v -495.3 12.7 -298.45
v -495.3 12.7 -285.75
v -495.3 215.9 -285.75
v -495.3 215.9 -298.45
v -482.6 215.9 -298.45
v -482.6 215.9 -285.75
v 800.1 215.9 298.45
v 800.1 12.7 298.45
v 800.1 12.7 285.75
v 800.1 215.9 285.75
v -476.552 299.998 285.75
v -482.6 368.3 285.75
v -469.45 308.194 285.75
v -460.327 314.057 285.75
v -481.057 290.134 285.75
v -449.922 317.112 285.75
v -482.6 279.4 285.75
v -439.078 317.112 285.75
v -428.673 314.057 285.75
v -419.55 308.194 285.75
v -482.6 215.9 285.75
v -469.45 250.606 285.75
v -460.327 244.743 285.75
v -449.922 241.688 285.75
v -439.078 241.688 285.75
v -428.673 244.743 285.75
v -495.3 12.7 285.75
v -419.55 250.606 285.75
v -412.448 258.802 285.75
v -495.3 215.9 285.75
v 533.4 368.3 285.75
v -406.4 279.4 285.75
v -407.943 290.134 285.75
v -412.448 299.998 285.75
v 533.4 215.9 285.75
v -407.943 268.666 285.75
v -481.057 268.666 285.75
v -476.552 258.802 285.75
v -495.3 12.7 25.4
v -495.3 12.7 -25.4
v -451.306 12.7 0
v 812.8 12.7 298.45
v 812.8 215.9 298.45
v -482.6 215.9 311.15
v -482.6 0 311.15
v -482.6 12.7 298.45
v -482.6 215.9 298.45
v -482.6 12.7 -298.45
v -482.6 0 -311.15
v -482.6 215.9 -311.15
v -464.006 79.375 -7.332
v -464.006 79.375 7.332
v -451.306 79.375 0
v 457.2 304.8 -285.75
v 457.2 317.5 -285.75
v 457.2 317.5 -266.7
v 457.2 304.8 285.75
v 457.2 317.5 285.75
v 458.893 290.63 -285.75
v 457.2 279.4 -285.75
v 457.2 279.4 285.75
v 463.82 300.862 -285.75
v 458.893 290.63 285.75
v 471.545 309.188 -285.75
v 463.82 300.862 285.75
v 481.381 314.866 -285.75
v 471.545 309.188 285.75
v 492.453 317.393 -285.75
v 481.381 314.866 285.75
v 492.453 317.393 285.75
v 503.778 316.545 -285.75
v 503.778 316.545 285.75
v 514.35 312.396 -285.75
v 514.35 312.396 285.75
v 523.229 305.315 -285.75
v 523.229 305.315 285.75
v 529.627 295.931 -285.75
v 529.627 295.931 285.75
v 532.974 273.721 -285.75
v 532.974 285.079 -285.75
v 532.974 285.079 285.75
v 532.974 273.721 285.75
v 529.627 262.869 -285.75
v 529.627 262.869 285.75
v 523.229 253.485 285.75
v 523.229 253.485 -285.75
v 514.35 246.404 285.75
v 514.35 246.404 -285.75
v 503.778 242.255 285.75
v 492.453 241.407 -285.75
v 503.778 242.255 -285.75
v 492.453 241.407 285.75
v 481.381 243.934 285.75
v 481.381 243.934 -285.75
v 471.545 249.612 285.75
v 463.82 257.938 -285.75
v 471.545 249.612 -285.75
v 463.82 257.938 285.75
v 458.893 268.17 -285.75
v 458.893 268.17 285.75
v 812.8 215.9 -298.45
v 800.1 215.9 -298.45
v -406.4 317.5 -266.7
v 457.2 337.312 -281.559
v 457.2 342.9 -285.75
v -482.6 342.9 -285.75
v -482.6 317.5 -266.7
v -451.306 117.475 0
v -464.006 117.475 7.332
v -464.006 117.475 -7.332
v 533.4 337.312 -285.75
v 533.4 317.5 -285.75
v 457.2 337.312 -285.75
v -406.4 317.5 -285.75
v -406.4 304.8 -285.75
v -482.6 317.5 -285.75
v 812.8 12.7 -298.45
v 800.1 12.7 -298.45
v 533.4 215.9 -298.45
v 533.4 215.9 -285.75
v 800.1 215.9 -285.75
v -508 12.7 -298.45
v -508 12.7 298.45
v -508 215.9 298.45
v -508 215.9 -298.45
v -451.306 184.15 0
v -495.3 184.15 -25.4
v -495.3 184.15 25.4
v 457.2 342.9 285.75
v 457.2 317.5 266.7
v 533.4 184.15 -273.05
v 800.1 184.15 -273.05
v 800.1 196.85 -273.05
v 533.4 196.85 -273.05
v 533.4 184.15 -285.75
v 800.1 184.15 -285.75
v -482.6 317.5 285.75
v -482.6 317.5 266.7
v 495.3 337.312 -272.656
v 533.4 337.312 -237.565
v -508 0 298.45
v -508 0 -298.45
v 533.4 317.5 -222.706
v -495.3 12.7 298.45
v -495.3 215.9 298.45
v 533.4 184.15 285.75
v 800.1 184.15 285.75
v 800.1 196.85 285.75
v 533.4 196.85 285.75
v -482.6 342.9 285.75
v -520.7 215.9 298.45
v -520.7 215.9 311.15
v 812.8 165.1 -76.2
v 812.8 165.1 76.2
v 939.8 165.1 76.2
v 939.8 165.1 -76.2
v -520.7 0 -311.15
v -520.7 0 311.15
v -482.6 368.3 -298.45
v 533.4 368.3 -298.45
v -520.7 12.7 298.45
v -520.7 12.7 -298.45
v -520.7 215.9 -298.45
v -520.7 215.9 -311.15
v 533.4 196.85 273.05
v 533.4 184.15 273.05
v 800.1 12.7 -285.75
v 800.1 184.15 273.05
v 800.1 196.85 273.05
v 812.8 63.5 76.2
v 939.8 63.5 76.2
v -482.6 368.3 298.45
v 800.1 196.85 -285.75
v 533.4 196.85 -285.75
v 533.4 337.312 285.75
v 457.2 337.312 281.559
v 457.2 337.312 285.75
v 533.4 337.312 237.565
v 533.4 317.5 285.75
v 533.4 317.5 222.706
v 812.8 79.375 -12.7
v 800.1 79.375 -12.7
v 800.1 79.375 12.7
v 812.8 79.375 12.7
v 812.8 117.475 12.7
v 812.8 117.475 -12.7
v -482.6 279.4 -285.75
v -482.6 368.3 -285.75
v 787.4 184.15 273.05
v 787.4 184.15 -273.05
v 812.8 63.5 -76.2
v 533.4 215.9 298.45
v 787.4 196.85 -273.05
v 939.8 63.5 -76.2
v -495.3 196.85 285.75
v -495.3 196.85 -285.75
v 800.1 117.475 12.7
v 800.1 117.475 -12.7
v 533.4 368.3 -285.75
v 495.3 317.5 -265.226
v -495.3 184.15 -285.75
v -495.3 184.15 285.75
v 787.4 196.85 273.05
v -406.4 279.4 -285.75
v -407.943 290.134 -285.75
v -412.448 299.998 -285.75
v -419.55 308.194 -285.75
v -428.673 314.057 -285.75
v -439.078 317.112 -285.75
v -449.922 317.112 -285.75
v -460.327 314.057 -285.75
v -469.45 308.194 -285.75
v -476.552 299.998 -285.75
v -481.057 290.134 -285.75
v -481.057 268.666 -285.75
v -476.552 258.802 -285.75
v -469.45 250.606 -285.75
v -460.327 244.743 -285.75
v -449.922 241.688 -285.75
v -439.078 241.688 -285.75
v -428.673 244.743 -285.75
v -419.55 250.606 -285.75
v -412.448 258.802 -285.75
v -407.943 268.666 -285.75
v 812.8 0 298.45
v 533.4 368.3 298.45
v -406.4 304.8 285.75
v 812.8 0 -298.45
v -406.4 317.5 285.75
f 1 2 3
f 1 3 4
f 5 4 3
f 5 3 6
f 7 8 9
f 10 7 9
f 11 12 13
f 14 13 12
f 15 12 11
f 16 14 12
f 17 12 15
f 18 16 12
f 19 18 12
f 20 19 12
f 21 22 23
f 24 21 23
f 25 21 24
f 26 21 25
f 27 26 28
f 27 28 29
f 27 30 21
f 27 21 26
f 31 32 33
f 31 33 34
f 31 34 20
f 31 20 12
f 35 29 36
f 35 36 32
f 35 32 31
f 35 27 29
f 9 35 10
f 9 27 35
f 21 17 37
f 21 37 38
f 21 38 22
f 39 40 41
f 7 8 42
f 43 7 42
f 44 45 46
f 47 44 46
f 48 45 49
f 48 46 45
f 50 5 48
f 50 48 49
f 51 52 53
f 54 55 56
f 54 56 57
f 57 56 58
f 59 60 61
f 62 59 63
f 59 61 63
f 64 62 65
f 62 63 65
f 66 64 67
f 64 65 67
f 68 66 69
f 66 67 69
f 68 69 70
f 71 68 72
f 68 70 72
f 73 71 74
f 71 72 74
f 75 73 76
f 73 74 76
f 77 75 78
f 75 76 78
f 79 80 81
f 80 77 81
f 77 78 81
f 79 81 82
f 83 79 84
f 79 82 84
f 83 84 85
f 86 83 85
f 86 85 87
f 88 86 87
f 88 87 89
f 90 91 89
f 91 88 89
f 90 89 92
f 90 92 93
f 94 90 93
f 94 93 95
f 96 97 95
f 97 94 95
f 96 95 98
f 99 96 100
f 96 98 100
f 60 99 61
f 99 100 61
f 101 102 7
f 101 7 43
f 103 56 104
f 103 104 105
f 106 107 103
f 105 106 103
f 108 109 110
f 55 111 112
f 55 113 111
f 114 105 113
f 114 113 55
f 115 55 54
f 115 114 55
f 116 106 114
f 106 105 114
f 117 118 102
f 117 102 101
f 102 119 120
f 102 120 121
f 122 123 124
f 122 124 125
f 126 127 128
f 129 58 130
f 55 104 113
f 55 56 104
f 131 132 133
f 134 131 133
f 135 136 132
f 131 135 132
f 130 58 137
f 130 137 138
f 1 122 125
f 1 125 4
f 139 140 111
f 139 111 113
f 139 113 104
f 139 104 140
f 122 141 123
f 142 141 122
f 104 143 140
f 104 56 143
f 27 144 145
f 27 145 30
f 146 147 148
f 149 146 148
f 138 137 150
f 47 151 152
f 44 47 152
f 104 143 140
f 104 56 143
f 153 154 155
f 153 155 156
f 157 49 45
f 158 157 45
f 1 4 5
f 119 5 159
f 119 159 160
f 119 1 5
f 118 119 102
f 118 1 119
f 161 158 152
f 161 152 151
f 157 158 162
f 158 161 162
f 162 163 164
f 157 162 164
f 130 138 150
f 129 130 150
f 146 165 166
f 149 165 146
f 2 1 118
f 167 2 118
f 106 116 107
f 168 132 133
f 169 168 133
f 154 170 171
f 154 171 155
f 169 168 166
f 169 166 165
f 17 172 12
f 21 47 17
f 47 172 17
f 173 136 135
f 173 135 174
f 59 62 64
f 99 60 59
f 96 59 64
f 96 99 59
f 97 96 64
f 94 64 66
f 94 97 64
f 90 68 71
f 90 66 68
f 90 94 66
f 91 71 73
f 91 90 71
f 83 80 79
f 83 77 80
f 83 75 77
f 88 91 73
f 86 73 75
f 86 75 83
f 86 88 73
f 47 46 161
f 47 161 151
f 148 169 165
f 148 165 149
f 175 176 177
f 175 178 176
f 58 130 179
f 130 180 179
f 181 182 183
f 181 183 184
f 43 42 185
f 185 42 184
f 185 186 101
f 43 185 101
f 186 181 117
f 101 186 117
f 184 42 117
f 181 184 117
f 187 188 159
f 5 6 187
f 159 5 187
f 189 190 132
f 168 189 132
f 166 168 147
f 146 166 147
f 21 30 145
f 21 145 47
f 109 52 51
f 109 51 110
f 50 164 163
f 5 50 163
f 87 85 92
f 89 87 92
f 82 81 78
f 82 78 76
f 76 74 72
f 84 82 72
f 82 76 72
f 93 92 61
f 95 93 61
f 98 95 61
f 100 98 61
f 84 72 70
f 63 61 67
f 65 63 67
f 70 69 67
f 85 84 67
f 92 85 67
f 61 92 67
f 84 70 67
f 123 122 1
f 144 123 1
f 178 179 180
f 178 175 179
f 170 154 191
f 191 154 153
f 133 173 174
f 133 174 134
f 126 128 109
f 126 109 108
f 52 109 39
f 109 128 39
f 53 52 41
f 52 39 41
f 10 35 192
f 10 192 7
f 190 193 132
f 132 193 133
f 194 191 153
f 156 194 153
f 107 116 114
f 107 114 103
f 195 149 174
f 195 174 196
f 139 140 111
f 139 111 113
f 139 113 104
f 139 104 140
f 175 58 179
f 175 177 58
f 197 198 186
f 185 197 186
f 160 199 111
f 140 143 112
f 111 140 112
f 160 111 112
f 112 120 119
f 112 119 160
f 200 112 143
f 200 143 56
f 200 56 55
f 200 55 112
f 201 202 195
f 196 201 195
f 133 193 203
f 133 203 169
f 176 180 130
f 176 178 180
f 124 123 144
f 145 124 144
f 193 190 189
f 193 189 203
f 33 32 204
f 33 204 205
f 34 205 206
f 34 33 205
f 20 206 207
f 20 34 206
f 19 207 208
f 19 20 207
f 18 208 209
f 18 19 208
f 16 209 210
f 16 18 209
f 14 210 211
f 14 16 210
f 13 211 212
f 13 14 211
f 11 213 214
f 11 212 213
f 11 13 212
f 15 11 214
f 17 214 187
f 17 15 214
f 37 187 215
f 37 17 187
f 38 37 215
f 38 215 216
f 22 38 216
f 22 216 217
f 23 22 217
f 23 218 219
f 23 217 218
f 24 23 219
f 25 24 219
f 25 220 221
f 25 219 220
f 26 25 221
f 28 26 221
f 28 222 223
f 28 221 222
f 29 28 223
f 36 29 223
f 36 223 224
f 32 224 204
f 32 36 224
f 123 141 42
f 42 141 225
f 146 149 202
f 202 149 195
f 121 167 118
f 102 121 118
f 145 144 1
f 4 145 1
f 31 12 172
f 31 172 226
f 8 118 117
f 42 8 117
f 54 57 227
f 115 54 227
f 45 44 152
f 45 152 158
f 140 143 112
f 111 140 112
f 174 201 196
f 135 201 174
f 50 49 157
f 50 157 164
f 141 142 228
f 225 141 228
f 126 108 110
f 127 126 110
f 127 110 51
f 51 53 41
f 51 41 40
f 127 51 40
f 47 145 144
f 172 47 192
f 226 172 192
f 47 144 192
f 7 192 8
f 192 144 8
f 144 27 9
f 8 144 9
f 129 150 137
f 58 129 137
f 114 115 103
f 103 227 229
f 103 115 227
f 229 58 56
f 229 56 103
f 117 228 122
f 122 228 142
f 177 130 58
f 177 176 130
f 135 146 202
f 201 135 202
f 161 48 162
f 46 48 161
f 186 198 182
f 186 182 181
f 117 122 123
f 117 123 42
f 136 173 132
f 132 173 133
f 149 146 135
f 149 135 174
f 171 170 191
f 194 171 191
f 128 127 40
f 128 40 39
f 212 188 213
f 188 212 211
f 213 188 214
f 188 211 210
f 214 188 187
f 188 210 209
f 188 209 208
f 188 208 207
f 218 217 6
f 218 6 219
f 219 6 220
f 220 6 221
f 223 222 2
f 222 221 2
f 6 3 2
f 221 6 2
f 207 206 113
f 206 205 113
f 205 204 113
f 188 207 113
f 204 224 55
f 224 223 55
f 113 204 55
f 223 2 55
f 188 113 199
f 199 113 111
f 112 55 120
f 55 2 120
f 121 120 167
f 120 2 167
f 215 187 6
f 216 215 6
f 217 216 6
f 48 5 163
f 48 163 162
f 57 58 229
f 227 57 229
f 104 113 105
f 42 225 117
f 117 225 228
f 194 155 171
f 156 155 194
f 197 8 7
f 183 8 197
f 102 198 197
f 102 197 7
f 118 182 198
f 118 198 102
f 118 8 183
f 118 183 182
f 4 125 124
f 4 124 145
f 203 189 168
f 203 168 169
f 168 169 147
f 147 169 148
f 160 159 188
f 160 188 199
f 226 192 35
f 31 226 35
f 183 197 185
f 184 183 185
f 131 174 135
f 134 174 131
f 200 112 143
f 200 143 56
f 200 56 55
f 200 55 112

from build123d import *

# Parameters (mm, degrees)
SKETCH1_W                             = 1016
SKETCH1_H                             = 596.9
SKETCH1_W_2                           = 304.8
FOND_DEPTH                            = 12.7
SKETCH2_W                             = 1295.4
SKETCH2_H                             = 12.7
COT_S_HAUT_DEPTH                      = 203.2
COT_S_HAUT_2_DEPTH                    = 203.2
SKETCH3_W                             = 12.7
SKETCH3_H                             = 596.9
COT_ES_BAS_DEPTH                      = 203.2
COT_ES_BAS_2_DEPTH                    = 203.2
SKETCH4_W                             = 1016
SKETCH4_H                             = 12.7
SUPPORT_CAGE_DEPTH                    = 152.4
SKETCH5_W                             = 12.7
SKETCH5_H                             = 12.7
SUPPORT_TRAPPE_COT_ES_DEPTH           = 266.7
SUPPORT_TRAPPE_COT_ES_2_DEPTH         = 266.7
SUPPORT_TRAPPE_DEVANT_REACH           = 1061.67
SKETCH6_W                             = 12.7
SKETCH6_H                             = 12.7
PLANCHER_MILLIEU_REACH                = 1068.573
SKETCH7_W                             = 1028.7
SKETCH7_H                             = 12.7
ROULEAU_REACH                         = 1068.573
SKETCH8_R                             = 38.1
SKETCH10_W                            = 863.6
SKETCH10_H                            = 12.7
SOUTIEN_TAPIS_DEPTH                   = 571.5
REBORD_START                          = -1016
REBORD_TAPIS_DEPTH                    = 939.8
V_POUR_VIS_SANS_FIN_DEPTH             = 171.45
SKETCH14_W                            = 152.4
SKETCH14_H                            = 101.6
MOTEUR_VIS_SANS_FIN_DEPTH             = 127
TROU_V_VIS_SANS_FIN_REACH             = 1054.588
SKETCH17_W                            = 12.7
SKETCH17_H                            = 38.1
TROU_V_VIS_SANS_FIN_DIRECTION_2_REACH = 1054.588
TROU_SORTIE_VIS_SANS_FIN_DEPTH        = 12.7
TROU_SORTIE_VIS_SANS_FIN_DEPTH_BACK   = 12.7
SKETCH18_W                            = 127
SKETCH18_H                            = 38.1
REBORD_START_2                        = -25.4
REBORD_POUR_SAC_POUBELLE_DEPTH        = 38.1


with BuildPart() as part:
    # Sketch1 → Fond (new body)
    with BuildSketch(Plane(origin=(0, 0, 0), x_dir=(1, 0, 0), z_dir=(0, 1, 0))):
        Rectangle(SKETCH1_W, SKETCH1_H)
        with Locations((660.4, 0)):
            Rectangle(SKETCH1_W_2, SKETCH1_H)
    extrude(amount=FOND_DEPTH)


with BuildPart() as body_2:
    # Sketch2 → Cotés Haut (new body)
    with BuildSketch(Plane(origin=(0, 12.7, 0), x_dir=(1, 0, 0), z_dir=(0, 1, 0))):
        with Locations((152.4, 292.1)):
            Rectangle(SKETCH2_W, SKETCH2_H)
    extrude(amount=COT_S_HAUT_DEPTH)



with BuildPart() as body_3:
    # Sketch2 → Cot_s Haut 2 (new body)
    with BuildSketch(Plane(origin=(0, 12.7, 0), x_dir=(1, 0, 0), z_dir=(0, 1, 0))):
        with Locations((152.4, -292.1)):
            Rectangle(SKETCH2_W, SKETCH2_H)
    extrude(amount=COT_S_HAUT_2_DEPTH)


with BuildPart() as body_4:
    # Sketch3 → Cotées Bas (new body)
    with BuildSketch(Plane(origin=(0, 12.7, 0), x_dir=(1, 0, 0), z_dir=(0, 1, 0))):
        with Locations((-501.65, 0)):
            Rectangle(SKETCH3_W, SKETCH3_H)
    extrude(amount=COT_ES_BAS_DEPTH)


with BuildPart() as body_5:
    # Sketch3 → Cot_es Bas 2 (new body)
    with BuildSketch(Plane(origin=(0, 12.7, 0), x_dir=(1, 0, 0), z_dir=(0, 1, 0))):
        with Locations((806.45, 0)):
            Rectangle(SKETCH3_W, SKETCH3_H)
    extrude(amount=COT_ES_BAS_2_DEPTH)

    # Sketch18 → Trou sortie vis sans fin (cut, two sides: drawn at the far end of the back side and taken through both)
    with BuildSketch(Plane.XY.offset(-TROU_SORTIE_VIS_SANS_FIN_DEPTH_BACK)):
        with Locations((863.6, 98.425)):
            Rectangle(SKETCH18_W, SKETCH18_H)
    extrude(amount=TROU_SORTIE_VIS_SANS_FIN_DEPTH + TROU_SORTIE_VIS_SANS_FIN_DEPTH_BACK, mode=Mode.SUBTRACT)


with BuildPart() as body_2_1:
    add(body_2.part)

    add(body_3.part)  # Support Cage merges body 3
    # Sketch4 → Support Cage (add)
    with BuildSketch(Plane(origin=(0, 215.9, 0), x_dir=(1, 0, 0), z_dir=(0, 1, 0))):
        with Locations((25.4, 292.1)):
            Rectangle(SKETCH4_W, SKETCH4_H)
        with Locations((25.4, -292.1)):
            Rectangle(SKETCH4_W, SKETCH4_H)
    extrude(amount=SUPPORT_CAGE_DEPTH)


with BuildPart() as body_5_2:
    # Sketch5 → Support Trappe cotées (new body)
    with BuildSketch(Plane.ZY.offset(-800.1)):
        with Locations((-279.4, 190.5)):
            Rectangle(SKETCH5_W, SKETCH5_H)
    extrude(amount=SUPPORT_TRAPPE_COT_ES_DEPTH)


with BuildPart() as body_6:
    # Sketch5 → Support Trappe cot_es 2 (new body)
    with BuildSketch(Plane.ZY.offset(-800.1)):
        with Locations((279.4, 190.5)):
            Rectangle(SKETCH5_W, SKETCH5_H)
    extrude(amount=SUPPORT_TRAPPE_COT_ES_2_DEPTH)


with BuildPart() as body_7:

    # Sketch6 → Support Trappe devant (new, up to next)
    with BuildSketch(Plane.XY.offset(-273.05), mode=Mode.PRIVATE) as support_trappe_devant_sk1:
        with Locations((793.75, 190.5)):
            Rectangle(SKETCH6_W, SKETCH6_H)
    support_trappe_devant_tool1 = extrude(support_trappe_devant_sk1.sketch, amount=SUPPORT_TRAPPE_DEVANT_REACH, mode=Mode.PRIVATE) - body_6.part
    add(support_trappe_devant_tool1.solids().sort_by_distance((793.75, 190.5, -273.05))[0])


with BuildPart() as body_8:

    # Sketch7 → Plancher millieu (new, up to next)
    with BuildSketch(Plane(origin=(0, 0, 285.75), x_dir=(-1, 0, 0), z_dir=(0, 0, -1)), mode=Mode.PRIVATE) as plancher_millieu_sk1:
        with Locations((-19.05, 190.5)):
            Rectangle(SKETCH7_W, SKETCH7_H)
    plancher_millieu_tool1 = extrude(plancher_millieu_sk1.sketch, amount=PLANCHER_MILLIEU_REACH, mode=Mode.PRIVATE) - body_2_1.part
    add(plancher_millieu_tool1.solids().sort_by_distance((19.05, 190.5, 285.75))[0])


with BuildPart() as body_9:

    # Sketch8 → Rouleau (new, up to next)
    with BuildSketch(Plane(origin=(0, 0, 285.75), x_dir=(-1, 0, 0), z_dir=(0, 0, -1)), mode=Mode.PRIVATE) as rouleau_sk1:
        with Locations((-495.3, 279.4)):
            Circle(SKETCH8_R)
    rouleau_tool1 = extrude(rouleau_sk1.sketch, amount=ROULEAU_REACH, mode=Mode.PRIVATE) - body_2_1.part
    rouleau = rouleau_tool1.solids().sort_by_distance((495.3, 279.4, 285.75))[0]
    add(rouleau)


with BuildPart() as body_2_2:
    add(body_2_1.part)

    # Mirror1: Rouleau across plane
    add(rouleau.mirror(Plane(origin=(25.4, 0, 0), x_dir=(0, 0, 1), z_dir=(1, 0, 0))))

    # Mirror9 2: loft between two sections, ruled curve by curve
    mirror9_2_from = [
        Edge.make_line((533.4, 337.312, -237.564909488), (533.4, 337.312, -285.75)),
        Edge.make_line((533.4, 317.5, -285.75), (533.4, 317.5, -222.705909488)),
        Edge.make_line((533.4, 317.5, -222.705909488), (533.4, 337.312, -237.564909488)),
        Edge.make_line((533.4, 317.5, -285.75), (533.4, 337.312, -285.75)),
    ]
    mirror9_2_to = [
        Edge.make_line((457.2, 337.312, -281.559), (457.2, 337.312, -285.75)),
        Edge.make_line((457.2, 317.5, -285.75), (457.2, 317.5, -266.7)),
        Edge.make_line((457.2, 317.5, -266.7), (457.2, 337.312, -281.559)),
        Edge.make_line((457.2, 317.5, -285.75), (457.2, 337.312, -285.75)),
    ]
    mirror9_2 = Solid(Shell([*[Face.make_surface_from_curves(mirror9_2_from[k], mirror9_2_to[k]) for k in range(4)], Face(Wire(mirror9_2_from)), Face(Wire(mirror9_2_to))]))
    add(mirror9_2)


with BuildPart() as body_10:
    # Sketch10 → Soutien tapis (new body)
    with BuildSketch(Plane(origin=(0, 0, 285.75), x_dir=(-1, 0, 0), z_dir=(0, 0, -1))):
        with Locations((-25.4, 311.15)):
            Rectangle(SKETCH10_W, SKETCH10_H)
    extrude(amount=SOUTIEN_TAPIS_DEPTH)


with BuildPart() as body_11:
    # Rebord tapis: read off the stored shape, not the designer's step
    # Rebord tapis outline → Rebord tapis (new body)
    with BuildSketch(Plane(origin=(533.4, 0, 0), x_dir=(0, 0, -1), z_dir=(1, 0, 0)).offset(REBORD_START)):
        Polygon((-285.75, 317.5), (-266.7, 317.5), (-285.75, 342.9), align=None)
    rebord_tapis = extrude(amount=REBORD_TAPIS_DEPTH)


with BuildPart() as body_10_1:
    add(body_10.part)

    # Mirror5: Rebord tapis across plane
    add(rebord_tapis.mirror(Plane.XY))

    # Mirror9: read off the stored shape, not the designer's step
    # Mirror9: loft between two sections, ruled curve by curve
    mirror9_from = [
        Edge.make_line((533.4, 317.5, -285.75), (533.4, 317.5, -222.705909488)),
        Edge.make_line((533.4, 337.312, -237.564909488), (533.4, 337.312, -285.75)),
        Edge.make_line((533.4, 317.5, -222.705909488), (533.4, 337.312, -237.564909488)),
        Edge.make_line((533.4, 337.312, -285.75), (533.4, 317.5, -285.75)),
    ]
    mirror9_to = [
        Edge.make_line((457.2, 317.5, -285.75), (457.2, 317.5, -266.7)),
        Edge.make_line((457.2, 337.312, -281.559), (457.2, 337.312, -285.75)),
        Edge.make_line((457.2, 317.5, -266.7), (457.2, 337.312, -281.559)),
        Edge.make_line((457.2, 337.312, -285.75), (457.2, 317.5, -285.75)),
    ]
    mirror9 = Solid(Shell([*[Face.make_surface_from_curves(mirror9_from[k], mirror9_to[k]) for k in range(4)], Face(Wire(mirror9_from)), Face(Wire(mirror9_to))]))
    add(mirror9)


with BuildPart() as body_12:
    # Sketch13 → V pour vis sans fin (new body)
    with BuildSketch(Plane(origin=(0, 12.7, 0), x_dir=(1, 0, 0), z_dir=(0, 1, 0))):
        Polygon((-451.305909488, 0), (-495.3, 25.4), (-495.3, -25.4), align=None)
    extrude(amount=V_POUR_VIS_SANS_FIN_DEPTH)

    # Trou V vis sans fin: up to this face of the body (flat: up to its plane)
    trou_v_vis_sans_fin_end = Plane(body_12.part.faces().sort_by_distance((-473.302954744, 98.425, -12.7))[0])
    # Sketch17 → Trou V vis sans fin (cut, up to the picked face)
    with BuildSketch(Plane.XY, mode=Mode.PRIVATE) as trou_v_vis_sans_fin_sk1:
        with Locations((-457.655909488, 98.425)):
            Rectangle(SKETCH17_W, SKETCH17_H)
    trou_v_vis_sans_fin_tool1 = split(extrude(trou_v_vis_sans_fin_sk1.sketch, amount=-TROU_V_VIS_SANS_FIN_REACH, mode=Mode.PRIVATE), bisect_by=trou_v_vis_sans_fin_end, keep=Keep.BOTH, mode=Mode.PRIVATE)
    add(trou_v_vis_sans_fin_tool1.solids().sort_by(Axis((-457.655909, 98.425, 0), (0, 0, -1)))[0], mode=Mode.SUBTRACT)

    # Trou V vis sans fin direction 2: up to this face of the body (flat: up to its plane)
    trou_v_vis_sans_fin_direction_2_end = Plane(body_12.part.faces().sort_by_distance((-473.302954744, 98.425, 12.7))[0])
    # Sketch17 → Trou V vis sans fin direction 2 (cut, up to the picked face)
    with BuildSketch(Plane.XY, mode=Mode.PRIVATE) as trou_v_vis_sans_fin_direction_2_sk1:
        with Locations((-457.655909488, 98.425)):
            Rectangle(SKETCH17_W, SKETCH17_H)
    trou_v_vis_sans_fin_direction_2_tool1 = split(extrude(trou_v_vis_sans_fin_direction_2_sk1.sketch, amount=TROU_V_VIS_SANS_FIN_DIRECTION_2_REACH, mode=Mode.PRIVATE), bisect_by=trou_v_vis_sans_fin_direction_2_end, keep=Keep.BOTH, mode=Mode.PRIVATE)
    add(trou_v_vis_sans_fin_direction_2_tool1.solids().sort_by(Axis((-457.655909, 98.425, 0), (0, 0, 1)))[0], mode=Mode.SUBTRACT)


with BuildPart() as body_13:
    # Sketch14 → Moteur vis sans fin (new body)
    with BuildSketch(Plane(origin=(812.8, 0, 0), x_dir=(0, 0, -1), z_dir=(1, 0, 0))):
        with Locations((0, 114.3)):
            Rectangle(SKETCH14_W, SKETCH14_H)
    extrude(amount=MOTEUR_VIS_SANS_FIN_DEPTH)


with BuildPart() as body_14:
    # Sketch19 → Rebord pour sac poubelle (new body)
    with BuildSketch(Plane.ZY.offset(508).offset(REBORD_START_2)):
        Polygon((298.45, 215.9), (311.15, 215.9), (311.15, 0), (298.45, 0), (-298.45, 0), (-311.15, 0), (-311.15, 215.9), (-298.45, 215.9), (-298.45, 12.7), (298.45, 12.7), align=None)
    extrude(amount=REBORD_POUR_SAC_POUBELLE_DEPTH)


with BuildPart() as body_15:
    # Sweep7: read off the stored shape, not the designer's step
    # Sweep7: loft between two sections, ruled curve by curve
    sweep7_from = [
        Edge.make_line((457.2, 317.5, 266.7), (457.2, 317.5, 285.75)),
        Edge.make_line((457.2, 317.5, 285.75), (533.4, 317.5, 285.75)),
        Edge.make_line((533.4, 317.5, 222.705909488), (457.2, 317.5, 266.7)),
        Edge.make_line((533.4, 317.5, 285.75), (533.4, 317.5, 222.705909488)),
    ]
    sweep7_to = [
        Edge.make_line((457.2, 337.312, 281.559), (457.2, 337.312, 285.75)),
        Edge.make_line((457.2, 337.312, 285.75), (533.4, 337.312, 285.75)),
        Edge.make_line((533.4, 337.312, 237.564909488), (457.2, 337.312, 281.559)),
        Edge.make_line((533.4, 337.312, 285.75), (533.4, 337.312, 237.564909488)),
    ]
    sweep7 = Solid(Shell([*[Face.make_surface_from_curves(sweep7_from[k], sweep7_to[k]) for k in range(4)], Face(Wire(sweep7_from)), Face(Wire(sweep7_to))]))
    add(sweep7)


solid = Compound([part.part, body_4.part, body_5.part, body_5_2.part, body_6.part, body_7.part, body_8.part, body_9.part, body_2_2.part, body_11.part, body_10_1.part, body_12.part, body_13.part, body_14.part, body_15.part])
